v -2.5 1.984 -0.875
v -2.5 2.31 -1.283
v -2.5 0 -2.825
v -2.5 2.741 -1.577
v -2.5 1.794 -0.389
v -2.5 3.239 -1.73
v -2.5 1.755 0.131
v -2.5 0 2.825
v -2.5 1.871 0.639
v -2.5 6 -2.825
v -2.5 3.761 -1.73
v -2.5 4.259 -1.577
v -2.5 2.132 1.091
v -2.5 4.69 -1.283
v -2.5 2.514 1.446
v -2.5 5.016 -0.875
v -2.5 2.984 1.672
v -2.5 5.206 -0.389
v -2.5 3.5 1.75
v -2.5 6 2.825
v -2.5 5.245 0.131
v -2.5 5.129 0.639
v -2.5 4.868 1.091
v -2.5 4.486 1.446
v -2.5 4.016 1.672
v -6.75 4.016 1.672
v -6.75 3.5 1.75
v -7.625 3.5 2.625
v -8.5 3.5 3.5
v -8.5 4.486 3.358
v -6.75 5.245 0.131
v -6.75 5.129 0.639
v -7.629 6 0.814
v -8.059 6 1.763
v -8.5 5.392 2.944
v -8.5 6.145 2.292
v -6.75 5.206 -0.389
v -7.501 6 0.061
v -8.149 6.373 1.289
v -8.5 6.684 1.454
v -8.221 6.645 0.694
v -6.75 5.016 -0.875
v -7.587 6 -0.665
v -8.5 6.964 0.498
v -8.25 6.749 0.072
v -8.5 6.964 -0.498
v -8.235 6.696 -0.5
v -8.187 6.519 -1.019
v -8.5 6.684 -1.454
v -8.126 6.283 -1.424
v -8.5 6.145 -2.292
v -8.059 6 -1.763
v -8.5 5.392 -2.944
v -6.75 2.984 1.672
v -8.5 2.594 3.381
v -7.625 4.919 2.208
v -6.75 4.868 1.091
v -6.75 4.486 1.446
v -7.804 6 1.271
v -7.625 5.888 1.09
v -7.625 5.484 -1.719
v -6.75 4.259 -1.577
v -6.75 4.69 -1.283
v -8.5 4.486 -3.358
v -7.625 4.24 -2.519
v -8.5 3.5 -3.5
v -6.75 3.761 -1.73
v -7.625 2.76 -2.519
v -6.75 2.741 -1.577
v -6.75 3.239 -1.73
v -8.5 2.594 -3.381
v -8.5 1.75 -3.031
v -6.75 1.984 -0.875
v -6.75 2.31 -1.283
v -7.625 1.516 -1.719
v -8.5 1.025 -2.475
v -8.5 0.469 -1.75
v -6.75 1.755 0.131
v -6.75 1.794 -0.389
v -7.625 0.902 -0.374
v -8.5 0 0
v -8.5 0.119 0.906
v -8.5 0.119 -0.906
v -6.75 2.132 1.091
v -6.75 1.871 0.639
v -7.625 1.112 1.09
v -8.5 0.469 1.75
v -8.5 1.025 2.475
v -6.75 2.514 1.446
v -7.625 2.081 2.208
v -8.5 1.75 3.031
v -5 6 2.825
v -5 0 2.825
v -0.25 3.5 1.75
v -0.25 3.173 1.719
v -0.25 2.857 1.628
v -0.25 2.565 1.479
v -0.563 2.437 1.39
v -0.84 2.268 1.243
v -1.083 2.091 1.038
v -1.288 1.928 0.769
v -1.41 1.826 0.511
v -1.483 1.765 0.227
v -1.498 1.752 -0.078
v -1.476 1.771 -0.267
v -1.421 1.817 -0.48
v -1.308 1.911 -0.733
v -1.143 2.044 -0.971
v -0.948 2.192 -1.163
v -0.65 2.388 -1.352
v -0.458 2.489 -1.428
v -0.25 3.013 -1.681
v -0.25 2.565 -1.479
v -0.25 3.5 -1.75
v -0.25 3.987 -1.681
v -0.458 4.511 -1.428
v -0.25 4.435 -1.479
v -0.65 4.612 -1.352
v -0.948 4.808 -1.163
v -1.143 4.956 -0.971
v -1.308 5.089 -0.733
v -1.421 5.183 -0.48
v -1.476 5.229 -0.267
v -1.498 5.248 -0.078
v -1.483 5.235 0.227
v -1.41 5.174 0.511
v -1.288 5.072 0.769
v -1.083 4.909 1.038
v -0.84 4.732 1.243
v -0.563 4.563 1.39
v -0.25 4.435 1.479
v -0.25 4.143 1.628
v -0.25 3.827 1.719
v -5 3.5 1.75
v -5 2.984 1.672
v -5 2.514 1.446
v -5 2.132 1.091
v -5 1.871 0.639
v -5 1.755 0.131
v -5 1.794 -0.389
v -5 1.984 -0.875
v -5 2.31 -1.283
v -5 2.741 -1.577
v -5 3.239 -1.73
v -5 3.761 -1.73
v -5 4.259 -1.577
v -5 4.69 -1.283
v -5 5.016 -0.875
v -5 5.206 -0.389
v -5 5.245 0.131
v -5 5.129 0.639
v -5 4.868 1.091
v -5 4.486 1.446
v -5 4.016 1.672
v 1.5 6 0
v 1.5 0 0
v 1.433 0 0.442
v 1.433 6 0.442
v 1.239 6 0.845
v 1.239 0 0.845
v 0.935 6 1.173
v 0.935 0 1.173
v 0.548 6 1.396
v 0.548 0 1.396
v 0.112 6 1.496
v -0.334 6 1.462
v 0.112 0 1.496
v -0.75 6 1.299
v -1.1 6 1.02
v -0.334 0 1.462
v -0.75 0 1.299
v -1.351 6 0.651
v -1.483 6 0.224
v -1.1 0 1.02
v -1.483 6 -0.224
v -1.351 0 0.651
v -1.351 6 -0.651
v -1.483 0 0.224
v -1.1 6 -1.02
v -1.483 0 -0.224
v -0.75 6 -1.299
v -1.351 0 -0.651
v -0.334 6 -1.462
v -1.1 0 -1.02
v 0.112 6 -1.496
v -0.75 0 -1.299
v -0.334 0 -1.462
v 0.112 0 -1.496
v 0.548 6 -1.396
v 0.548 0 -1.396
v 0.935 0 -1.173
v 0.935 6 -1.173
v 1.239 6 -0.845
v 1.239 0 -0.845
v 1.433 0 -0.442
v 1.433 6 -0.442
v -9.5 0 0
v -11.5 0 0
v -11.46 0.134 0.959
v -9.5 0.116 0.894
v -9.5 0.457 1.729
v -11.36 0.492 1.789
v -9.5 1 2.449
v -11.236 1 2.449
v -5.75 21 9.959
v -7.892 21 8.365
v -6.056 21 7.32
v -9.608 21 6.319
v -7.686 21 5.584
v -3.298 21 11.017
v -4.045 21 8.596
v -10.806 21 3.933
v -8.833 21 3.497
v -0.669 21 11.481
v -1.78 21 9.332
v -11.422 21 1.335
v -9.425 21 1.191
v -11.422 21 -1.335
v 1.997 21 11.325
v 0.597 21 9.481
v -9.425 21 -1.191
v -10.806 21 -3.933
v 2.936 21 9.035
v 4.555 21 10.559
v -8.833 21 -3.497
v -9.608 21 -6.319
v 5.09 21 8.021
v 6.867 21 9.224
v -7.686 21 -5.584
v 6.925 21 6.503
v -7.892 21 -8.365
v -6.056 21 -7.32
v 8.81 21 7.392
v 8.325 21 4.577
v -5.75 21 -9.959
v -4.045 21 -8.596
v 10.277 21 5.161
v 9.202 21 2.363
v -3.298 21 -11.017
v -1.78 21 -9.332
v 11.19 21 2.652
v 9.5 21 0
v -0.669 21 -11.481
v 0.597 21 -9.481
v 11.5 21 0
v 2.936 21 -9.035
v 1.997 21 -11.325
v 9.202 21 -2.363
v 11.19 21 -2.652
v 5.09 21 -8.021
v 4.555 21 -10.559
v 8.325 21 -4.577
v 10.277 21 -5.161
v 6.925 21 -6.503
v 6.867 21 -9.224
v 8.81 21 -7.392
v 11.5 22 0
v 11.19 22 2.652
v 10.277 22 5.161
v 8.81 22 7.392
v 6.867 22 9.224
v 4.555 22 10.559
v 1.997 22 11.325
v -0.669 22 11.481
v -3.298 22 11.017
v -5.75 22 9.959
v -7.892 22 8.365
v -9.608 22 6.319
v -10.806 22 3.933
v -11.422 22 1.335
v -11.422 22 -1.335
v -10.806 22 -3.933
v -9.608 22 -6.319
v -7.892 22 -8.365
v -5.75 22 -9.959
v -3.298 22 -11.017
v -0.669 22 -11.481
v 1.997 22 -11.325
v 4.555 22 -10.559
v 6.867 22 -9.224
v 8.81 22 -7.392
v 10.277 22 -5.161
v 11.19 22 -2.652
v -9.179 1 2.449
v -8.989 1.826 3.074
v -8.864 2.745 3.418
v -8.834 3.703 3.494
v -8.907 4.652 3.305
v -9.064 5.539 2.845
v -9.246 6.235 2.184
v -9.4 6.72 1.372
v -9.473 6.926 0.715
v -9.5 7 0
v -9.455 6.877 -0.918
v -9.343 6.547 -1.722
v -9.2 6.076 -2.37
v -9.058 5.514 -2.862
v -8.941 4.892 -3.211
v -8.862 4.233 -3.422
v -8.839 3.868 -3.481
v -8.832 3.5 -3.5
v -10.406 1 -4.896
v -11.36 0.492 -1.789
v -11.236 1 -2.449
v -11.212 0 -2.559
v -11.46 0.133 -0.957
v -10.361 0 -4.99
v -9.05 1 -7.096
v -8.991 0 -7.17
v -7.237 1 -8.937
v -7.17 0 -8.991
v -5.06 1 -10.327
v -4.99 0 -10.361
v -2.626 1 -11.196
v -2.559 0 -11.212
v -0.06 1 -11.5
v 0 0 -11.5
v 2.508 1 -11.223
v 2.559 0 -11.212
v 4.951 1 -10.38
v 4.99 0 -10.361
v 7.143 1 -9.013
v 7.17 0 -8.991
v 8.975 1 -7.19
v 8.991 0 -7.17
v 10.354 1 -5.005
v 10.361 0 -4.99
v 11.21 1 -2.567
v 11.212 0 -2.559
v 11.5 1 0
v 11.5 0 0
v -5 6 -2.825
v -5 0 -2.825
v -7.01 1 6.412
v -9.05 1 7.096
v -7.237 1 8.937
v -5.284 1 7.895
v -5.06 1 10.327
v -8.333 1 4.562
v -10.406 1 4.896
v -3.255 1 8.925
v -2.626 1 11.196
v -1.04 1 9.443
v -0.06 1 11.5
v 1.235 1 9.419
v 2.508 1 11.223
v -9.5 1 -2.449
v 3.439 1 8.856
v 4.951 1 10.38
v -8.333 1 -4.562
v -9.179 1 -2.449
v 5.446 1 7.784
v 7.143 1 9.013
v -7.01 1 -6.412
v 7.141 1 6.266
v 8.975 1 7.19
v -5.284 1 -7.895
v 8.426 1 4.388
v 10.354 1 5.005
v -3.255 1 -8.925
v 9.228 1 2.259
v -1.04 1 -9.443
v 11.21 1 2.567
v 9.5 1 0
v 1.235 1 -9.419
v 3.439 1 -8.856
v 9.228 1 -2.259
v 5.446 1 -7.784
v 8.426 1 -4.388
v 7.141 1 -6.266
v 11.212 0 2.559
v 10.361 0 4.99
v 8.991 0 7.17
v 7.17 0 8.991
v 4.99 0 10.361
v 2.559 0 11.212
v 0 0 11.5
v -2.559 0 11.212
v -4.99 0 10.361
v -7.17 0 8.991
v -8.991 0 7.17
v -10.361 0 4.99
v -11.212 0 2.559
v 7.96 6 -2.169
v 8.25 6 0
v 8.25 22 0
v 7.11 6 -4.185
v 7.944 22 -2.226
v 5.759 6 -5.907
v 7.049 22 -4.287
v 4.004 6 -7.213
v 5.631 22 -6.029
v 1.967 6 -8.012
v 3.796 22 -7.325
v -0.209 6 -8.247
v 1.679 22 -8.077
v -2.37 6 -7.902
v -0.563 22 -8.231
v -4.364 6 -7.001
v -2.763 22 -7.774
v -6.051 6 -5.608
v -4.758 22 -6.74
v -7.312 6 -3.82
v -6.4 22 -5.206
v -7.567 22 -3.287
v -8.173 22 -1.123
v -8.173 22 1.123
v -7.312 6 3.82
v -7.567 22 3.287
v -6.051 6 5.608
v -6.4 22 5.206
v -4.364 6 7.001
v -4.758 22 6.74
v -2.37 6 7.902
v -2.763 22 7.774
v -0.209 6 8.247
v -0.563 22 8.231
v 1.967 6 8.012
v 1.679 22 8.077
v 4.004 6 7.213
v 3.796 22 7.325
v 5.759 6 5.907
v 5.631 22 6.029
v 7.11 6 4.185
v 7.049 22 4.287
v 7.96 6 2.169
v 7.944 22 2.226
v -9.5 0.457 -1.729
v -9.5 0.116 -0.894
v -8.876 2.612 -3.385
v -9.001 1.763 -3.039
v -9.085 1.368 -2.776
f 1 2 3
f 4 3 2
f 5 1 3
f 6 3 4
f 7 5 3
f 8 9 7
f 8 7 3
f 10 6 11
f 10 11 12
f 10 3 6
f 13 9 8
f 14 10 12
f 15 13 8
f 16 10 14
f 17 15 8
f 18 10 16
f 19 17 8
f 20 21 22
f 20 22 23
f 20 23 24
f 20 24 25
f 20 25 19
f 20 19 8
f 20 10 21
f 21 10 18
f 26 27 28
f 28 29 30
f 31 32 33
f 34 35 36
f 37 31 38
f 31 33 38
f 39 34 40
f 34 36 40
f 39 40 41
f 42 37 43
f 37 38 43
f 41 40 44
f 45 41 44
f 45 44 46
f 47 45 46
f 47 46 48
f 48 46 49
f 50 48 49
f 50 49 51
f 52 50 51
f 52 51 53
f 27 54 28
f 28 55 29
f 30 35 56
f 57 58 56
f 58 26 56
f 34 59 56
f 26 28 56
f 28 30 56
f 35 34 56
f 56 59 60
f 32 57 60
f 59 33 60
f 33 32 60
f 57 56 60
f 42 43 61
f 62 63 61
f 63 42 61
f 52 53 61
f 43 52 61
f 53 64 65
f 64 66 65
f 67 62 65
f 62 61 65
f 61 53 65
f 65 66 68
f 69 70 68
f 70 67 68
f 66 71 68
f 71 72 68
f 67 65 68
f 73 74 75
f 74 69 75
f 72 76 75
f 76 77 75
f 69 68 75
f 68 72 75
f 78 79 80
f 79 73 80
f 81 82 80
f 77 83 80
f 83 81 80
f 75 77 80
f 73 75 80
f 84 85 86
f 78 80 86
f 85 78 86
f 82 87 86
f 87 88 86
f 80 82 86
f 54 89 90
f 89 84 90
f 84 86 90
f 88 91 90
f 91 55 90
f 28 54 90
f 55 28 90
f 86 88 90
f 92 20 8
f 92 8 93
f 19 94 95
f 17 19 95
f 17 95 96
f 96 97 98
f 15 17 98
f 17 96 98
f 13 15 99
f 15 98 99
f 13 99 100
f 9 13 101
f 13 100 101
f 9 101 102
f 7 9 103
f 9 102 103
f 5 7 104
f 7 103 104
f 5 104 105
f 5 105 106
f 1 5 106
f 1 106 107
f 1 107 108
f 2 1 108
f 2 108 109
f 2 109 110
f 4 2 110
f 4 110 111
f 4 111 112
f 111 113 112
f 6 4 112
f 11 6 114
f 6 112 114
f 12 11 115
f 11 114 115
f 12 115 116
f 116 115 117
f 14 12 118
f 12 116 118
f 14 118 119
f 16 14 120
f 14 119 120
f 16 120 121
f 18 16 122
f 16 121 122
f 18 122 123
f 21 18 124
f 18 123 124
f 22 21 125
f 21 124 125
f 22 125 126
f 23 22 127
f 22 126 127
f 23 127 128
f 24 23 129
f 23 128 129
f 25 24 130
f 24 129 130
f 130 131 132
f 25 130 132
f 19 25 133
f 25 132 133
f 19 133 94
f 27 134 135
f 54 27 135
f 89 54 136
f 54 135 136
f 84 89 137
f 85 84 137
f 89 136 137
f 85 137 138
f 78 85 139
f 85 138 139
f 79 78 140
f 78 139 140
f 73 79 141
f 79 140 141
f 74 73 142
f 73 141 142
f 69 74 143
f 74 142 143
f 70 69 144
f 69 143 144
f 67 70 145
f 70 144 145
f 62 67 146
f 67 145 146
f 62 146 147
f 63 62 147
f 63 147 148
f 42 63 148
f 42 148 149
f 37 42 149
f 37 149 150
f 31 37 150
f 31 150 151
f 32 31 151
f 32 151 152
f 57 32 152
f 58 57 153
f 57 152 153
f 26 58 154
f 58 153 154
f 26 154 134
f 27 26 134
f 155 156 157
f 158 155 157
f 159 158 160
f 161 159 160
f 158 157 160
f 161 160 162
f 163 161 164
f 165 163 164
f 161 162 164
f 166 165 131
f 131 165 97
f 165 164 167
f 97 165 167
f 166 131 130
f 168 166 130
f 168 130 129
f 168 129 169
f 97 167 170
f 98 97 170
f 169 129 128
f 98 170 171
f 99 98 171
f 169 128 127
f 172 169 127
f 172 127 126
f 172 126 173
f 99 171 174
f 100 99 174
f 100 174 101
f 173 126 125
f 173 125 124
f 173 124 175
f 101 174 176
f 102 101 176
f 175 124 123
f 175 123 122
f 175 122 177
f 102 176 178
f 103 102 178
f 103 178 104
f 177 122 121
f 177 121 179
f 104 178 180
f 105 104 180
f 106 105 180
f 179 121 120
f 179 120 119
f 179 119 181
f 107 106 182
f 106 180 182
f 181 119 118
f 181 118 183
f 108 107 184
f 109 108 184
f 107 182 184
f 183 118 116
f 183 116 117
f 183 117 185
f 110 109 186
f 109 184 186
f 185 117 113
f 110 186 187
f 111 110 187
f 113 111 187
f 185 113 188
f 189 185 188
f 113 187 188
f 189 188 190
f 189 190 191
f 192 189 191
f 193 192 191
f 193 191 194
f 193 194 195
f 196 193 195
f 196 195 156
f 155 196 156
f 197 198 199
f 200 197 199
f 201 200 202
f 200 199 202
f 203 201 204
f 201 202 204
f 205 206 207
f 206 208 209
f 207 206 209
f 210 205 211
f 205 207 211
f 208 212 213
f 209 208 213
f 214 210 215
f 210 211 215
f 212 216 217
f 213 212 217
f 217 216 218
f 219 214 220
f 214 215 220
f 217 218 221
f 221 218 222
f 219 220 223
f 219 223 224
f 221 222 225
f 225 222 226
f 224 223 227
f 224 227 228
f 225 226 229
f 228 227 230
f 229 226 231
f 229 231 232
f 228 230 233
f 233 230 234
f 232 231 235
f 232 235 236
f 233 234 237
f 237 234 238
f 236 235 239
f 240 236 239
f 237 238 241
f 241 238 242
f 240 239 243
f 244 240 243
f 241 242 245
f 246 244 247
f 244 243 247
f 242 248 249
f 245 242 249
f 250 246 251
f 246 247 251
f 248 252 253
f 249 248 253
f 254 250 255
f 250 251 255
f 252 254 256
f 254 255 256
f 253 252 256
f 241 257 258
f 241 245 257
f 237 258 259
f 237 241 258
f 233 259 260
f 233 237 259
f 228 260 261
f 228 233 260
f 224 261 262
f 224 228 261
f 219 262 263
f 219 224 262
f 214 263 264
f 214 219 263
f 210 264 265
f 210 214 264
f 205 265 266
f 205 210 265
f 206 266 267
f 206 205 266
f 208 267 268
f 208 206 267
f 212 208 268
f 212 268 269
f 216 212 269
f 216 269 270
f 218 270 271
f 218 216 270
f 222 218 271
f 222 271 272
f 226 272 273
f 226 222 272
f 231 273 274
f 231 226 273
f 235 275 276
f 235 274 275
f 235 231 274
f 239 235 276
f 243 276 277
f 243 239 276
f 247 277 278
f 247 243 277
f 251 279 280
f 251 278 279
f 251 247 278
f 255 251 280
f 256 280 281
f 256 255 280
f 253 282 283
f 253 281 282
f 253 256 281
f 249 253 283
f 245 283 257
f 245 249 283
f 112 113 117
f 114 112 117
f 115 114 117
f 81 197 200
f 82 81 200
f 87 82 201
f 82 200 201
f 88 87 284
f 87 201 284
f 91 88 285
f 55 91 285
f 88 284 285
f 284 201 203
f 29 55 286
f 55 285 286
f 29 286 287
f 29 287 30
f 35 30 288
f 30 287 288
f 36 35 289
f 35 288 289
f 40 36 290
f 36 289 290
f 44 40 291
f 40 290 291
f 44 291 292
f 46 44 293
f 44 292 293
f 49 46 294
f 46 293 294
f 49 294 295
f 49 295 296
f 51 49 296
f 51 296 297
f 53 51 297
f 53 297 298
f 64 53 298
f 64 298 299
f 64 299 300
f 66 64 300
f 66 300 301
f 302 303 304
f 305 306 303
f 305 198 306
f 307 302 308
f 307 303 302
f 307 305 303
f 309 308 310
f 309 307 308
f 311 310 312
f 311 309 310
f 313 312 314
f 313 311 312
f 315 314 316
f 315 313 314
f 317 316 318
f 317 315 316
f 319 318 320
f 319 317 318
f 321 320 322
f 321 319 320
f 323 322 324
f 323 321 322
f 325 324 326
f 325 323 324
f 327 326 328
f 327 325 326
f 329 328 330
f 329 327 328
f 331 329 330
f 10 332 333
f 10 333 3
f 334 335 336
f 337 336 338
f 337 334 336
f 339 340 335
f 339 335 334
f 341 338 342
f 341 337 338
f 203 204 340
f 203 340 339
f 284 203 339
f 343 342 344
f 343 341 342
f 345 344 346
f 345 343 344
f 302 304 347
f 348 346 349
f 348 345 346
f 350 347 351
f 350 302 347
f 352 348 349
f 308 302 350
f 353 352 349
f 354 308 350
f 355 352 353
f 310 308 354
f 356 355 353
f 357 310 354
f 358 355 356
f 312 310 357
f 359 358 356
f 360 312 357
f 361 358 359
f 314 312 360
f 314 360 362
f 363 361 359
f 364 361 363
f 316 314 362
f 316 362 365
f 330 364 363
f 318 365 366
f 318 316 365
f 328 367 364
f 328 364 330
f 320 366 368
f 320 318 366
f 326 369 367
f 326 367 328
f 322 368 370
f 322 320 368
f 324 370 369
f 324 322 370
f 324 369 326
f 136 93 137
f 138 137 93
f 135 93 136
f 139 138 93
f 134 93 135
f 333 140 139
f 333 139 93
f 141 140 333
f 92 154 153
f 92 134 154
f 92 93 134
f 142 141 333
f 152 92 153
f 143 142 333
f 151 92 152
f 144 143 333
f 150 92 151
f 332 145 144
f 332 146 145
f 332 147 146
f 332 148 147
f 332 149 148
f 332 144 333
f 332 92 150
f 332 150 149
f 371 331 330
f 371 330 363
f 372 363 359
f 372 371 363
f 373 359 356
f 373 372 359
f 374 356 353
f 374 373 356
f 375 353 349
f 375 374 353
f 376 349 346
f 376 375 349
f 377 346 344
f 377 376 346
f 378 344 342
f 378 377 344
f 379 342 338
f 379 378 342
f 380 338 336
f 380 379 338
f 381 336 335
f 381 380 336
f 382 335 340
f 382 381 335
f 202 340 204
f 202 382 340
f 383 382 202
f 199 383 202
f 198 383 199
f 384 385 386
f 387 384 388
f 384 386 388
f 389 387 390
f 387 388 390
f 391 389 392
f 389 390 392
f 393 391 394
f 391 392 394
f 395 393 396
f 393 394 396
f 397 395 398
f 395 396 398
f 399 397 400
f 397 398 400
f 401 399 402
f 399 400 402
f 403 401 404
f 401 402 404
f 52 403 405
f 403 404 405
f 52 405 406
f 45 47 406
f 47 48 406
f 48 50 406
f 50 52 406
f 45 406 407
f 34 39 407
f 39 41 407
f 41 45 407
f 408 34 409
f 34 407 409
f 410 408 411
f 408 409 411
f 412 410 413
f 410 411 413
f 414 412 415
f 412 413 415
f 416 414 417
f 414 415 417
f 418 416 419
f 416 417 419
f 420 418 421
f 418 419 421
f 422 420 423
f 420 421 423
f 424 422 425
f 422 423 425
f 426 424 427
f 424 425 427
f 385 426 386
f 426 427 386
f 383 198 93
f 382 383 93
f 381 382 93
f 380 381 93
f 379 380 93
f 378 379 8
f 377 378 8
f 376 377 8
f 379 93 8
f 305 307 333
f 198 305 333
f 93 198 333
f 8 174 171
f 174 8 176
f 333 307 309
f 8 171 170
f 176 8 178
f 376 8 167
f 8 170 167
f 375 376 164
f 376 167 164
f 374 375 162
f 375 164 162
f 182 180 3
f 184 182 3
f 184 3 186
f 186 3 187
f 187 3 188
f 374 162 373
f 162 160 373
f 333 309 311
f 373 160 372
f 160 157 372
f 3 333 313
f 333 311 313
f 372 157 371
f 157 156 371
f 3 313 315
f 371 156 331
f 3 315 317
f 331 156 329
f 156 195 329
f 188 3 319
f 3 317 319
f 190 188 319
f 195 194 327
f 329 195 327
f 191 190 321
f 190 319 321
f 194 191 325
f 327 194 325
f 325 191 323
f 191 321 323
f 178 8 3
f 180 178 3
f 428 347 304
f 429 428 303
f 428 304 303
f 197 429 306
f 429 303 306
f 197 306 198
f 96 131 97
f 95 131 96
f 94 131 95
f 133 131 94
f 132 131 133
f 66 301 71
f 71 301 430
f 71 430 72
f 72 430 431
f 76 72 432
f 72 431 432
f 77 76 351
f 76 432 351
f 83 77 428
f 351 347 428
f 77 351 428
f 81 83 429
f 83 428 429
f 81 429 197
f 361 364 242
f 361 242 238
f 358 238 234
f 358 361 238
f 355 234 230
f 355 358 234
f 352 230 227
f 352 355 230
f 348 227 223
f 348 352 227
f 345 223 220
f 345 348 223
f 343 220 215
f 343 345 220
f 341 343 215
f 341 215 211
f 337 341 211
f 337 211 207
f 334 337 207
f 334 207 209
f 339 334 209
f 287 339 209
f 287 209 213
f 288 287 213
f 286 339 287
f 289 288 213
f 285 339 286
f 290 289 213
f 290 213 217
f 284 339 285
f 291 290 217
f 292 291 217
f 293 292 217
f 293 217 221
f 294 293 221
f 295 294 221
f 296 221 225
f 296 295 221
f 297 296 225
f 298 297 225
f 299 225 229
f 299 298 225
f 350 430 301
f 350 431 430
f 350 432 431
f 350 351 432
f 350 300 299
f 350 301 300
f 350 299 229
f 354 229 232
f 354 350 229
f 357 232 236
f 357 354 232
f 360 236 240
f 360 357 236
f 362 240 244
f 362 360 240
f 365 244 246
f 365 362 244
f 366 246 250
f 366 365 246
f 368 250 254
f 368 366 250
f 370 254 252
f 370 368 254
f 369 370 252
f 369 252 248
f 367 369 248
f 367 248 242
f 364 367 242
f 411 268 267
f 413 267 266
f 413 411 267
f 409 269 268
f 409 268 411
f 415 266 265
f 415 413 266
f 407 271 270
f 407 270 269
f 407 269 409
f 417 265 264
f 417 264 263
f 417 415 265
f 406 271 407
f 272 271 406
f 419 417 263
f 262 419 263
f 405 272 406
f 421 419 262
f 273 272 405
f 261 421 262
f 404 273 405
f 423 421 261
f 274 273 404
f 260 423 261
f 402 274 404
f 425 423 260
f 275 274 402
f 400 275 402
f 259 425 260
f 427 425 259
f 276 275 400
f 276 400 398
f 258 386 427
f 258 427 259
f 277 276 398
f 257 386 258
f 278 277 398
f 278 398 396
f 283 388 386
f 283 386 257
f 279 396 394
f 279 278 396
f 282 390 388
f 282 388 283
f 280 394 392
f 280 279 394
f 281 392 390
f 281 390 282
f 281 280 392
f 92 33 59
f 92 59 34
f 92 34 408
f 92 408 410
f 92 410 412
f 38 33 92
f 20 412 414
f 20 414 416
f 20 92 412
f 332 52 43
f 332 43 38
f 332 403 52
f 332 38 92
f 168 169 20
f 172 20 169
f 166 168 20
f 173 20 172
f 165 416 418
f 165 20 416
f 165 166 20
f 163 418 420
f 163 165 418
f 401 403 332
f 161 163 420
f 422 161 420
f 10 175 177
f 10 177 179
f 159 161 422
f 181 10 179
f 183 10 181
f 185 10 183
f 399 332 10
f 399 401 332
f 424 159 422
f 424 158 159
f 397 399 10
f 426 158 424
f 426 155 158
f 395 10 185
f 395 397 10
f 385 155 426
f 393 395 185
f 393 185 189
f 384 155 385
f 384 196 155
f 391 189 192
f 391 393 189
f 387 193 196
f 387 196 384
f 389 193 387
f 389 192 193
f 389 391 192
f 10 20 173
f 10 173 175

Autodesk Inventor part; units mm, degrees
ref_plane "XZ Plane" through (0, 0, 0) normal (0, 1, 0) x (-1, 0, 0)
ref_plane "XY Plane" through (0, 0, 0) normal (0, 0, 1) x (1, 0, 0)
sketch "Sketch1" plane through (0, 0, 0) normal (0, 0, 1) x (1, 0, 0)
  line L0 (0, 0) -> (0, 22)
  line L1 (0, 22) -> (11.5, 22)
  line L2 (11.5, 22) -> (11.5, 21)
  line L3 (11.5, 21) -> (9.5, 21)
  line L4 (9.5, 21) -> (9.5, 1)
  line L5 (9.5, 1) -> (11.5, 1)
  line L6 (11.5, 1) -> (11.5, 0)
  line L7 (11.5, 0) -> (0, 0)
  point P0 (5.75, 0)
  dimension "d0" = 22
  dimension "d1" = 20
  dimension "d2" = 1
  dimension "d3" = 23
  dimension "d4" = 19
revolve "Revolution1" add sketch "Sketch1" angle 360 about axis through (0, 0, 0) along (0, 1, 0)
sketch "Sketch3" plane through (0, 22, 0) normal (0, 1, 0) x (1, 0, 0)
  circle A0 centre (0, 0) radius 8.25
  dimension "d6" = 16.5
extrude "Extrusion1" cut sketch "Sketch3" against normal blind 16
sketch "Sketch4" plane through (0, 0, 0) normal (0, -1, 0) x (1, 0, 0)
  circle A0 centre (0, 0) radius 1.5
  dimension "d9" = 3
extrude "Extrusion2" cut sketch "Sketch4" against normal through all
ref_plane "Work Plane1" through (-9.5, 11, 0) normal (1, 0, 0) x (0, 1, 0)
sketch "Sketch7" plane through (-9.5, 11, 0) normal (1, 0, 0) x (0, 1, 0)
  line L0 (-11, -11.5) -> (-11, 11.5) projected
  point P0 (-11, 0)
  point P1 (-7.5, 0)
  point P2 (-11, 0)
  dimension "d42" = 3.5
hole "Hole2" at (-9.5, 3.5, 0) direction (-1, 0, 0) diameter 7 end through all
sketch "Sketch8" plane through (-11.5, 0, 0) normal (0, -1, 0) x (1, 0, 0)
  line L0 (6.5, -2.825) -> (9, -2.825)
  line L1 (9, -2.825) -> (9, 2.825)
  line L2 (9, 2.825) -> (6.5, 2.825)
  line L3 (6.5, 2.825) -> (6.5, -2.825)
  circle A0 centre (11.5, 0) radius 9.5 projected
  point P0 (2.235, 2.1)
  point P1 (2.235, -2.1)
  dimension "d58" = 2.5
  dimension "d60" = 2.825
  dimension "d61" = 5.65
  dimension "d62" = 2.5
extrude "Extrusion6" cut sketch "Sketch8" along normal through all both and the other way through all contours L3 L2 L1 L0
ref_plane "Work Plane3" through (-8.5, 11, 0) normal (1, 0, 0) x (0, 1, 0)
sketch "Sketch9" plane through (-8.5, 11, 0) normal (1, 0, 0) x (0, 1, 0)
  point P0 (-11, 0)
  point P1 (-7.5, 0)
hole "Hole3" at (-8.5, 3.5, 0) direction (-1, 0, 0) diameter 7 end through all
hole "Hole4" at (-8.5, 3.5, 0) direction (1, 0, 0) diameter 3.5 depth 8.25 countersink diameter 7 countersink angle 90
properties part number "motor JS2622 jsumo"
